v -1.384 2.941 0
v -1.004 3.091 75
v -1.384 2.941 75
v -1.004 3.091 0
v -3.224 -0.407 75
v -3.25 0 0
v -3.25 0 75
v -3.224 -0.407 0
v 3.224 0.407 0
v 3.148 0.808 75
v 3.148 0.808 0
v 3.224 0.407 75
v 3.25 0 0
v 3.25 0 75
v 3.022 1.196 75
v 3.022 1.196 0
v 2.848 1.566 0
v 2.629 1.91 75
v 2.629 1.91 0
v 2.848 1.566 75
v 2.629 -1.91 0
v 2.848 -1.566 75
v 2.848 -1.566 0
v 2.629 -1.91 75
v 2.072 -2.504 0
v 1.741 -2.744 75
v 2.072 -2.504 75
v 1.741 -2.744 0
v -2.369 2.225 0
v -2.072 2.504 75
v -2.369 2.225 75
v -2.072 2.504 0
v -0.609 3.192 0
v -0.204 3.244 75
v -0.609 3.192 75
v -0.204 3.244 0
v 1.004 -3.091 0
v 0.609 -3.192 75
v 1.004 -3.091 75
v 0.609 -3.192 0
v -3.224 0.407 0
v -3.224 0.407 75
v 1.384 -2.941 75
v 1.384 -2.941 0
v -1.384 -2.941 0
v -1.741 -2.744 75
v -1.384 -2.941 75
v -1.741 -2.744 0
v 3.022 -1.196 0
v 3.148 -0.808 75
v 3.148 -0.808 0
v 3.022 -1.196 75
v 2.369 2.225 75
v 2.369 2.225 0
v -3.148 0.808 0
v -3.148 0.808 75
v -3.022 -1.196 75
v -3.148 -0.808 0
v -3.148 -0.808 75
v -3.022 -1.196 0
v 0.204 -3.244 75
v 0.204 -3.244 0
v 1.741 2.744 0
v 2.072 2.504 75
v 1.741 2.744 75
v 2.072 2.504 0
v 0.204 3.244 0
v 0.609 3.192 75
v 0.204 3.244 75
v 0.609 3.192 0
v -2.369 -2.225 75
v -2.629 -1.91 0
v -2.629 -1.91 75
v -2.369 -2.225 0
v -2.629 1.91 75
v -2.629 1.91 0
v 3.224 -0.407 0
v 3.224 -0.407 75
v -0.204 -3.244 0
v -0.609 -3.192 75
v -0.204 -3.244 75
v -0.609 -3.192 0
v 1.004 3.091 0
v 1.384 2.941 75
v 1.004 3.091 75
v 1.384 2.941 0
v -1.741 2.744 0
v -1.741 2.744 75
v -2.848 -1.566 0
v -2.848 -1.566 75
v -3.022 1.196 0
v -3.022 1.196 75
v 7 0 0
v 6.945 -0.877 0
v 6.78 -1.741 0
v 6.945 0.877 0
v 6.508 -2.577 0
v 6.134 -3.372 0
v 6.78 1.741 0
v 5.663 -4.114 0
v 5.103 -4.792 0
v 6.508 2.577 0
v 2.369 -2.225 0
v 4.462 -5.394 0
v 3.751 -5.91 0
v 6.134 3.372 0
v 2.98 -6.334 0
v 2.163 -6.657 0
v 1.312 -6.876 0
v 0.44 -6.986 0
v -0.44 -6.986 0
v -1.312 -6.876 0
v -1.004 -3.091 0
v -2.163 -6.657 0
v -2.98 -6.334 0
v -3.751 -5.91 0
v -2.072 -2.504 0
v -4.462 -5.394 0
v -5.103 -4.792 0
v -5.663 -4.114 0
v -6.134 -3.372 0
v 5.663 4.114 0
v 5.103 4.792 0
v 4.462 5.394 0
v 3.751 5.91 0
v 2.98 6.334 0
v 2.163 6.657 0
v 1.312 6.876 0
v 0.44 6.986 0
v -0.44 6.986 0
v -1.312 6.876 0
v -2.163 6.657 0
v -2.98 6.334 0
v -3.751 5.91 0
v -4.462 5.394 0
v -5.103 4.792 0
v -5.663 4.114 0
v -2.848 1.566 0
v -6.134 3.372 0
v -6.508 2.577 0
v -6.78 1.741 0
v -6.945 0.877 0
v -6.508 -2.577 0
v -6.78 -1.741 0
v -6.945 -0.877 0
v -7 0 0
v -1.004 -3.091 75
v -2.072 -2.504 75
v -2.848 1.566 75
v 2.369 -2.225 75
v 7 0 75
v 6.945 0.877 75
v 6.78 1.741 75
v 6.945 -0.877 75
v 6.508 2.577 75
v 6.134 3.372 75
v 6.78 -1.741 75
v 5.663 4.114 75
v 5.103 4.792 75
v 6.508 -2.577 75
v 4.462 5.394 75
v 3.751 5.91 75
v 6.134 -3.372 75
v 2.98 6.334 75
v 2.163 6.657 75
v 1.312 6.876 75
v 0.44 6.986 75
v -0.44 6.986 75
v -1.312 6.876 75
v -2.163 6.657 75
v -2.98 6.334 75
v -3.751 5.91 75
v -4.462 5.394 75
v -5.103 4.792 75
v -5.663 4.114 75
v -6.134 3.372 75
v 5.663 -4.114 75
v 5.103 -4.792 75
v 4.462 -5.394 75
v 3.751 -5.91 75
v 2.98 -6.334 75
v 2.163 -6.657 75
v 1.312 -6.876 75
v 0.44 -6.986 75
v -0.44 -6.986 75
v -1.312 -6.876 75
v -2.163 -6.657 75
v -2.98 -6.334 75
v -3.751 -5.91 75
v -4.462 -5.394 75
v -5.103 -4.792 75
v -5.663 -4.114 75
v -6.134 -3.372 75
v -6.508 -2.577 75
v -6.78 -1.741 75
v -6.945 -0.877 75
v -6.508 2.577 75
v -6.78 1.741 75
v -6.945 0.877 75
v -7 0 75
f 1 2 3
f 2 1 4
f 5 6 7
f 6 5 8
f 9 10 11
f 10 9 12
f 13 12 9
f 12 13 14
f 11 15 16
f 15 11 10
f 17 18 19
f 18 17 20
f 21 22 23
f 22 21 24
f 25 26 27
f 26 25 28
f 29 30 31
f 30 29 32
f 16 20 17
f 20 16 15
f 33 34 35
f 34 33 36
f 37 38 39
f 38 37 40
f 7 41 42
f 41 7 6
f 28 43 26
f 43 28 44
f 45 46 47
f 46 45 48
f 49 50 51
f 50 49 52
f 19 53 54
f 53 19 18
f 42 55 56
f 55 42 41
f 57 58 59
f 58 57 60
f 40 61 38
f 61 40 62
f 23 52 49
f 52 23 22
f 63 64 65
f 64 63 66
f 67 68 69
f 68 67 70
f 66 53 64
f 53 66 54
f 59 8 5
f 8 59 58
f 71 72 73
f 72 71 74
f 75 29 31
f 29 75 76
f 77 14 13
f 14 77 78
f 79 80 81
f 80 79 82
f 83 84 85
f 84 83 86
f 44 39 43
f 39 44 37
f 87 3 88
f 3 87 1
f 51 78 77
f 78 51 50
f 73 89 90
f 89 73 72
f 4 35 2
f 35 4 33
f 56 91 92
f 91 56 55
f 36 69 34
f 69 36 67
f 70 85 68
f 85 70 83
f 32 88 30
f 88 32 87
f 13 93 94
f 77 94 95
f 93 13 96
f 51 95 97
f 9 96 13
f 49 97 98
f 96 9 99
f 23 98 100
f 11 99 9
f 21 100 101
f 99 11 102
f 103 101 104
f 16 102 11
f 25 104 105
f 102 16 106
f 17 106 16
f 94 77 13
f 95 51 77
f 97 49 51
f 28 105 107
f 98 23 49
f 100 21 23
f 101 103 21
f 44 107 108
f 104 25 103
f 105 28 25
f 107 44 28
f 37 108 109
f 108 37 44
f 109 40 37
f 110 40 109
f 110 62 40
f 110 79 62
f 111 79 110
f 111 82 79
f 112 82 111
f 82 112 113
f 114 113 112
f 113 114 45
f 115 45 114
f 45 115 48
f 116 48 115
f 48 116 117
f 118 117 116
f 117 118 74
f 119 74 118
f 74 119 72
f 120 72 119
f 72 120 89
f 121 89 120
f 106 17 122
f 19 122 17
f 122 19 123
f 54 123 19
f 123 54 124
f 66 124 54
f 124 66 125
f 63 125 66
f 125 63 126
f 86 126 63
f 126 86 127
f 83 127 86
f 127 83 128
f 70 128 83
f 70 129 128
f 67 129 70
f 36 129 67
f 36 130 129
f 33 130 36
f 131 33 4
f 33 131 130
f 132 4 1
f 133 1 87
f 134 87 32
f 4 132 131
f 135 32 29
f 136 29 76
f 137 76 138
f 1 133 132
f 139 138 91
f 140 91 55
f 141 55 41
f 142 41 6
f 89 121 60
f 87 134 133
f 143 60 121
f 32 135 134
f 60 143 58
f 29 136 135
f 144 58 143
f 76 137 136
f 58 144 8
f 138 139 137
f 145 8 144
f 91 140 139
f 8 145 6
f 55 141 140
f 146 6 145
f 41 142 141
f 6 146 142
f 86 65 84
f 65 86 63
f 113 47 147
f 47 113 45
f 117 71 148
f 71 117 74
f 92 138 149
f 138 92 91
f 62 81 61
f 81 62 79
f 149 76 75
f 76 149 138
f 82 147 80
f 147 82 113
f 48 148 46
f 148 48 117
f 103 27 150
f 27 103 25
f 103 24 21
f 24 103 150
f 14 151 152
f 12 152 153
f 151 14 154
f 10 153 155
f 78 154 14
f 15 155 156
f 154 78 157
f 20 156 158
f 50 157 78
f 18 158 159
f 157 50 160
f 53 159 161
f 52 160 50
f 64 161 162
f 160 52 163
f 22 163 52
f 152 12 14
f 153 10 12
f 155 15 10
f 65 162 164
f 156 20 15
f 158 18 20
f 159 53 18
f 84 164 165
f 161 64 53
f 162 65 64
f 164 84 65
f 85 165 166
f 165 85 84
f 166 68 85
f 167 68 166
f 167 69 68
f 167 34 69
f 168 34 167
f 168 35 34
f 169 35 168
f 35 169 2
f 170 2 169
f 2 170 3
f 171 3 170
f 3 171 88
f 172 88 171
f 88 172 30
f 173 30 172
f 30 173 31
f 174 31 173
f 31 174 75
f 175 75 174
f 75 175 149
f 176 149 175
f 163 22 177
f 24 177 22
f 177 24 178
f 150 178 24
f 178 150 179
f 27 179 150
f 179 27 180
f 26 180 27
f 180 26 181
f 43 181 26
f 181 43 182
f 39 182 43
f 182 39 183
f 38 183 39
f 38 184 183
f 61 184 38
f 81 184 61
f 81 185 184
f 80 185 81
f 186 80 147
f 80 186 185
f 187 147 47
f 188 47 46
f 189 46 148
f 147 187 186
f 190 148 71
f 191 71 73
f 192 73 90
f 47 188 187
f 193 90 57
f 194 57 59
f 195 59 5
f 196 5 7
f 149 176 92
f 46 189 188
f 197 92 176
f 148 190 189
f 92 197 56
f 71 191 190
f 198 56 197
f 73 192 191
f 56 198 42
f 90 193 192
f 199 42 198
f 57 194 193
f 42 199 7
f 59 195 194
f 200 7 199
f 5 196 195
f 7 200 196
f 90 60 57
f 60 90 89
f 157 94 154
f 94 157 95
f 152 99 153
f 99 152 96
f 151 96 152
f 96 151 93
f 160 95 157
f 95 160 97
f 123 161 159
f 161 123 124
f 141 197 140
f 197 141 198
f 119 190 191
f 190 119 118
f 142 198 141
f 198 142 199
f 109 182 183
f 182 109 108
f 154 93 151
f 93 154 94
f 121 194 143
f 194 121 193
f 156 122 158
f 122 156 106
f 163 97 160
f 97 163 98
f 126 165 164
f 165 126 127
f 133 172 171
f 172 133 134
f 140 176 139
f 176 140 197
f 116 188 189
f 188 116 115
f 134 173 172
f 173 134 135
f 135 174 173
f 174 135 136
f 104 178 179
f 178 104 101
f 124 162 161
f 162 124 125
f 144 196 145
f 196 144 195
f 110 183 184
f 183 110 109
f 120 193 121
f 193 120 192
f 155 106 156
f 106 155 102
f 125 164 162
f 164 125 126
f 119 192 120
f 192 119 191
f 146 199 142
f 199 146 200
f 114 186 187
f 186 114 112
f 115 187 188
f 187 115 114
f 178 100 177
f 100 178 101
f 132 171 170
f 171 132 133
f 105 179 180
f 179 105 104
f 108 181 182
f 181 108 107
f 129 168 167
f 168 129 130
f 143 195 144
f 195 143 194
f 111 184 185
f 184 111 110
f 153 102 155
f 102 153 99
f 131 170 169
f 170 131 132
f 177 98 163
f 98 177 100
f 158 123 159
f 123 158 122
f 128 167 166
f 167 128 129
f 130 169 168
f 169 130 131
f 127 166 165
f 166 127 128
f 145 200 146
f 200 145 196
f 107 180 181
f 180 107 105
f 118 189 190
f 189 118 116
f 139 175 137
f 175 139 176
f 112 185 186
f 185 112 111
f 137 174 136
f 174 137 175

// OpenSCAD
$fn = 50;


difference() {
	union() {
		cylinder(h = 75, r = 7.0000000000);
	}
	union() {
		cylinder(h = 75, r = 3.2500000000);
		cylinder(h = 75, r = 1.8000000000);
		cylinder(h = 75, r = 1.8000000000);
		cylinder(h = 75, r = 1.8000000000);
	}
}
